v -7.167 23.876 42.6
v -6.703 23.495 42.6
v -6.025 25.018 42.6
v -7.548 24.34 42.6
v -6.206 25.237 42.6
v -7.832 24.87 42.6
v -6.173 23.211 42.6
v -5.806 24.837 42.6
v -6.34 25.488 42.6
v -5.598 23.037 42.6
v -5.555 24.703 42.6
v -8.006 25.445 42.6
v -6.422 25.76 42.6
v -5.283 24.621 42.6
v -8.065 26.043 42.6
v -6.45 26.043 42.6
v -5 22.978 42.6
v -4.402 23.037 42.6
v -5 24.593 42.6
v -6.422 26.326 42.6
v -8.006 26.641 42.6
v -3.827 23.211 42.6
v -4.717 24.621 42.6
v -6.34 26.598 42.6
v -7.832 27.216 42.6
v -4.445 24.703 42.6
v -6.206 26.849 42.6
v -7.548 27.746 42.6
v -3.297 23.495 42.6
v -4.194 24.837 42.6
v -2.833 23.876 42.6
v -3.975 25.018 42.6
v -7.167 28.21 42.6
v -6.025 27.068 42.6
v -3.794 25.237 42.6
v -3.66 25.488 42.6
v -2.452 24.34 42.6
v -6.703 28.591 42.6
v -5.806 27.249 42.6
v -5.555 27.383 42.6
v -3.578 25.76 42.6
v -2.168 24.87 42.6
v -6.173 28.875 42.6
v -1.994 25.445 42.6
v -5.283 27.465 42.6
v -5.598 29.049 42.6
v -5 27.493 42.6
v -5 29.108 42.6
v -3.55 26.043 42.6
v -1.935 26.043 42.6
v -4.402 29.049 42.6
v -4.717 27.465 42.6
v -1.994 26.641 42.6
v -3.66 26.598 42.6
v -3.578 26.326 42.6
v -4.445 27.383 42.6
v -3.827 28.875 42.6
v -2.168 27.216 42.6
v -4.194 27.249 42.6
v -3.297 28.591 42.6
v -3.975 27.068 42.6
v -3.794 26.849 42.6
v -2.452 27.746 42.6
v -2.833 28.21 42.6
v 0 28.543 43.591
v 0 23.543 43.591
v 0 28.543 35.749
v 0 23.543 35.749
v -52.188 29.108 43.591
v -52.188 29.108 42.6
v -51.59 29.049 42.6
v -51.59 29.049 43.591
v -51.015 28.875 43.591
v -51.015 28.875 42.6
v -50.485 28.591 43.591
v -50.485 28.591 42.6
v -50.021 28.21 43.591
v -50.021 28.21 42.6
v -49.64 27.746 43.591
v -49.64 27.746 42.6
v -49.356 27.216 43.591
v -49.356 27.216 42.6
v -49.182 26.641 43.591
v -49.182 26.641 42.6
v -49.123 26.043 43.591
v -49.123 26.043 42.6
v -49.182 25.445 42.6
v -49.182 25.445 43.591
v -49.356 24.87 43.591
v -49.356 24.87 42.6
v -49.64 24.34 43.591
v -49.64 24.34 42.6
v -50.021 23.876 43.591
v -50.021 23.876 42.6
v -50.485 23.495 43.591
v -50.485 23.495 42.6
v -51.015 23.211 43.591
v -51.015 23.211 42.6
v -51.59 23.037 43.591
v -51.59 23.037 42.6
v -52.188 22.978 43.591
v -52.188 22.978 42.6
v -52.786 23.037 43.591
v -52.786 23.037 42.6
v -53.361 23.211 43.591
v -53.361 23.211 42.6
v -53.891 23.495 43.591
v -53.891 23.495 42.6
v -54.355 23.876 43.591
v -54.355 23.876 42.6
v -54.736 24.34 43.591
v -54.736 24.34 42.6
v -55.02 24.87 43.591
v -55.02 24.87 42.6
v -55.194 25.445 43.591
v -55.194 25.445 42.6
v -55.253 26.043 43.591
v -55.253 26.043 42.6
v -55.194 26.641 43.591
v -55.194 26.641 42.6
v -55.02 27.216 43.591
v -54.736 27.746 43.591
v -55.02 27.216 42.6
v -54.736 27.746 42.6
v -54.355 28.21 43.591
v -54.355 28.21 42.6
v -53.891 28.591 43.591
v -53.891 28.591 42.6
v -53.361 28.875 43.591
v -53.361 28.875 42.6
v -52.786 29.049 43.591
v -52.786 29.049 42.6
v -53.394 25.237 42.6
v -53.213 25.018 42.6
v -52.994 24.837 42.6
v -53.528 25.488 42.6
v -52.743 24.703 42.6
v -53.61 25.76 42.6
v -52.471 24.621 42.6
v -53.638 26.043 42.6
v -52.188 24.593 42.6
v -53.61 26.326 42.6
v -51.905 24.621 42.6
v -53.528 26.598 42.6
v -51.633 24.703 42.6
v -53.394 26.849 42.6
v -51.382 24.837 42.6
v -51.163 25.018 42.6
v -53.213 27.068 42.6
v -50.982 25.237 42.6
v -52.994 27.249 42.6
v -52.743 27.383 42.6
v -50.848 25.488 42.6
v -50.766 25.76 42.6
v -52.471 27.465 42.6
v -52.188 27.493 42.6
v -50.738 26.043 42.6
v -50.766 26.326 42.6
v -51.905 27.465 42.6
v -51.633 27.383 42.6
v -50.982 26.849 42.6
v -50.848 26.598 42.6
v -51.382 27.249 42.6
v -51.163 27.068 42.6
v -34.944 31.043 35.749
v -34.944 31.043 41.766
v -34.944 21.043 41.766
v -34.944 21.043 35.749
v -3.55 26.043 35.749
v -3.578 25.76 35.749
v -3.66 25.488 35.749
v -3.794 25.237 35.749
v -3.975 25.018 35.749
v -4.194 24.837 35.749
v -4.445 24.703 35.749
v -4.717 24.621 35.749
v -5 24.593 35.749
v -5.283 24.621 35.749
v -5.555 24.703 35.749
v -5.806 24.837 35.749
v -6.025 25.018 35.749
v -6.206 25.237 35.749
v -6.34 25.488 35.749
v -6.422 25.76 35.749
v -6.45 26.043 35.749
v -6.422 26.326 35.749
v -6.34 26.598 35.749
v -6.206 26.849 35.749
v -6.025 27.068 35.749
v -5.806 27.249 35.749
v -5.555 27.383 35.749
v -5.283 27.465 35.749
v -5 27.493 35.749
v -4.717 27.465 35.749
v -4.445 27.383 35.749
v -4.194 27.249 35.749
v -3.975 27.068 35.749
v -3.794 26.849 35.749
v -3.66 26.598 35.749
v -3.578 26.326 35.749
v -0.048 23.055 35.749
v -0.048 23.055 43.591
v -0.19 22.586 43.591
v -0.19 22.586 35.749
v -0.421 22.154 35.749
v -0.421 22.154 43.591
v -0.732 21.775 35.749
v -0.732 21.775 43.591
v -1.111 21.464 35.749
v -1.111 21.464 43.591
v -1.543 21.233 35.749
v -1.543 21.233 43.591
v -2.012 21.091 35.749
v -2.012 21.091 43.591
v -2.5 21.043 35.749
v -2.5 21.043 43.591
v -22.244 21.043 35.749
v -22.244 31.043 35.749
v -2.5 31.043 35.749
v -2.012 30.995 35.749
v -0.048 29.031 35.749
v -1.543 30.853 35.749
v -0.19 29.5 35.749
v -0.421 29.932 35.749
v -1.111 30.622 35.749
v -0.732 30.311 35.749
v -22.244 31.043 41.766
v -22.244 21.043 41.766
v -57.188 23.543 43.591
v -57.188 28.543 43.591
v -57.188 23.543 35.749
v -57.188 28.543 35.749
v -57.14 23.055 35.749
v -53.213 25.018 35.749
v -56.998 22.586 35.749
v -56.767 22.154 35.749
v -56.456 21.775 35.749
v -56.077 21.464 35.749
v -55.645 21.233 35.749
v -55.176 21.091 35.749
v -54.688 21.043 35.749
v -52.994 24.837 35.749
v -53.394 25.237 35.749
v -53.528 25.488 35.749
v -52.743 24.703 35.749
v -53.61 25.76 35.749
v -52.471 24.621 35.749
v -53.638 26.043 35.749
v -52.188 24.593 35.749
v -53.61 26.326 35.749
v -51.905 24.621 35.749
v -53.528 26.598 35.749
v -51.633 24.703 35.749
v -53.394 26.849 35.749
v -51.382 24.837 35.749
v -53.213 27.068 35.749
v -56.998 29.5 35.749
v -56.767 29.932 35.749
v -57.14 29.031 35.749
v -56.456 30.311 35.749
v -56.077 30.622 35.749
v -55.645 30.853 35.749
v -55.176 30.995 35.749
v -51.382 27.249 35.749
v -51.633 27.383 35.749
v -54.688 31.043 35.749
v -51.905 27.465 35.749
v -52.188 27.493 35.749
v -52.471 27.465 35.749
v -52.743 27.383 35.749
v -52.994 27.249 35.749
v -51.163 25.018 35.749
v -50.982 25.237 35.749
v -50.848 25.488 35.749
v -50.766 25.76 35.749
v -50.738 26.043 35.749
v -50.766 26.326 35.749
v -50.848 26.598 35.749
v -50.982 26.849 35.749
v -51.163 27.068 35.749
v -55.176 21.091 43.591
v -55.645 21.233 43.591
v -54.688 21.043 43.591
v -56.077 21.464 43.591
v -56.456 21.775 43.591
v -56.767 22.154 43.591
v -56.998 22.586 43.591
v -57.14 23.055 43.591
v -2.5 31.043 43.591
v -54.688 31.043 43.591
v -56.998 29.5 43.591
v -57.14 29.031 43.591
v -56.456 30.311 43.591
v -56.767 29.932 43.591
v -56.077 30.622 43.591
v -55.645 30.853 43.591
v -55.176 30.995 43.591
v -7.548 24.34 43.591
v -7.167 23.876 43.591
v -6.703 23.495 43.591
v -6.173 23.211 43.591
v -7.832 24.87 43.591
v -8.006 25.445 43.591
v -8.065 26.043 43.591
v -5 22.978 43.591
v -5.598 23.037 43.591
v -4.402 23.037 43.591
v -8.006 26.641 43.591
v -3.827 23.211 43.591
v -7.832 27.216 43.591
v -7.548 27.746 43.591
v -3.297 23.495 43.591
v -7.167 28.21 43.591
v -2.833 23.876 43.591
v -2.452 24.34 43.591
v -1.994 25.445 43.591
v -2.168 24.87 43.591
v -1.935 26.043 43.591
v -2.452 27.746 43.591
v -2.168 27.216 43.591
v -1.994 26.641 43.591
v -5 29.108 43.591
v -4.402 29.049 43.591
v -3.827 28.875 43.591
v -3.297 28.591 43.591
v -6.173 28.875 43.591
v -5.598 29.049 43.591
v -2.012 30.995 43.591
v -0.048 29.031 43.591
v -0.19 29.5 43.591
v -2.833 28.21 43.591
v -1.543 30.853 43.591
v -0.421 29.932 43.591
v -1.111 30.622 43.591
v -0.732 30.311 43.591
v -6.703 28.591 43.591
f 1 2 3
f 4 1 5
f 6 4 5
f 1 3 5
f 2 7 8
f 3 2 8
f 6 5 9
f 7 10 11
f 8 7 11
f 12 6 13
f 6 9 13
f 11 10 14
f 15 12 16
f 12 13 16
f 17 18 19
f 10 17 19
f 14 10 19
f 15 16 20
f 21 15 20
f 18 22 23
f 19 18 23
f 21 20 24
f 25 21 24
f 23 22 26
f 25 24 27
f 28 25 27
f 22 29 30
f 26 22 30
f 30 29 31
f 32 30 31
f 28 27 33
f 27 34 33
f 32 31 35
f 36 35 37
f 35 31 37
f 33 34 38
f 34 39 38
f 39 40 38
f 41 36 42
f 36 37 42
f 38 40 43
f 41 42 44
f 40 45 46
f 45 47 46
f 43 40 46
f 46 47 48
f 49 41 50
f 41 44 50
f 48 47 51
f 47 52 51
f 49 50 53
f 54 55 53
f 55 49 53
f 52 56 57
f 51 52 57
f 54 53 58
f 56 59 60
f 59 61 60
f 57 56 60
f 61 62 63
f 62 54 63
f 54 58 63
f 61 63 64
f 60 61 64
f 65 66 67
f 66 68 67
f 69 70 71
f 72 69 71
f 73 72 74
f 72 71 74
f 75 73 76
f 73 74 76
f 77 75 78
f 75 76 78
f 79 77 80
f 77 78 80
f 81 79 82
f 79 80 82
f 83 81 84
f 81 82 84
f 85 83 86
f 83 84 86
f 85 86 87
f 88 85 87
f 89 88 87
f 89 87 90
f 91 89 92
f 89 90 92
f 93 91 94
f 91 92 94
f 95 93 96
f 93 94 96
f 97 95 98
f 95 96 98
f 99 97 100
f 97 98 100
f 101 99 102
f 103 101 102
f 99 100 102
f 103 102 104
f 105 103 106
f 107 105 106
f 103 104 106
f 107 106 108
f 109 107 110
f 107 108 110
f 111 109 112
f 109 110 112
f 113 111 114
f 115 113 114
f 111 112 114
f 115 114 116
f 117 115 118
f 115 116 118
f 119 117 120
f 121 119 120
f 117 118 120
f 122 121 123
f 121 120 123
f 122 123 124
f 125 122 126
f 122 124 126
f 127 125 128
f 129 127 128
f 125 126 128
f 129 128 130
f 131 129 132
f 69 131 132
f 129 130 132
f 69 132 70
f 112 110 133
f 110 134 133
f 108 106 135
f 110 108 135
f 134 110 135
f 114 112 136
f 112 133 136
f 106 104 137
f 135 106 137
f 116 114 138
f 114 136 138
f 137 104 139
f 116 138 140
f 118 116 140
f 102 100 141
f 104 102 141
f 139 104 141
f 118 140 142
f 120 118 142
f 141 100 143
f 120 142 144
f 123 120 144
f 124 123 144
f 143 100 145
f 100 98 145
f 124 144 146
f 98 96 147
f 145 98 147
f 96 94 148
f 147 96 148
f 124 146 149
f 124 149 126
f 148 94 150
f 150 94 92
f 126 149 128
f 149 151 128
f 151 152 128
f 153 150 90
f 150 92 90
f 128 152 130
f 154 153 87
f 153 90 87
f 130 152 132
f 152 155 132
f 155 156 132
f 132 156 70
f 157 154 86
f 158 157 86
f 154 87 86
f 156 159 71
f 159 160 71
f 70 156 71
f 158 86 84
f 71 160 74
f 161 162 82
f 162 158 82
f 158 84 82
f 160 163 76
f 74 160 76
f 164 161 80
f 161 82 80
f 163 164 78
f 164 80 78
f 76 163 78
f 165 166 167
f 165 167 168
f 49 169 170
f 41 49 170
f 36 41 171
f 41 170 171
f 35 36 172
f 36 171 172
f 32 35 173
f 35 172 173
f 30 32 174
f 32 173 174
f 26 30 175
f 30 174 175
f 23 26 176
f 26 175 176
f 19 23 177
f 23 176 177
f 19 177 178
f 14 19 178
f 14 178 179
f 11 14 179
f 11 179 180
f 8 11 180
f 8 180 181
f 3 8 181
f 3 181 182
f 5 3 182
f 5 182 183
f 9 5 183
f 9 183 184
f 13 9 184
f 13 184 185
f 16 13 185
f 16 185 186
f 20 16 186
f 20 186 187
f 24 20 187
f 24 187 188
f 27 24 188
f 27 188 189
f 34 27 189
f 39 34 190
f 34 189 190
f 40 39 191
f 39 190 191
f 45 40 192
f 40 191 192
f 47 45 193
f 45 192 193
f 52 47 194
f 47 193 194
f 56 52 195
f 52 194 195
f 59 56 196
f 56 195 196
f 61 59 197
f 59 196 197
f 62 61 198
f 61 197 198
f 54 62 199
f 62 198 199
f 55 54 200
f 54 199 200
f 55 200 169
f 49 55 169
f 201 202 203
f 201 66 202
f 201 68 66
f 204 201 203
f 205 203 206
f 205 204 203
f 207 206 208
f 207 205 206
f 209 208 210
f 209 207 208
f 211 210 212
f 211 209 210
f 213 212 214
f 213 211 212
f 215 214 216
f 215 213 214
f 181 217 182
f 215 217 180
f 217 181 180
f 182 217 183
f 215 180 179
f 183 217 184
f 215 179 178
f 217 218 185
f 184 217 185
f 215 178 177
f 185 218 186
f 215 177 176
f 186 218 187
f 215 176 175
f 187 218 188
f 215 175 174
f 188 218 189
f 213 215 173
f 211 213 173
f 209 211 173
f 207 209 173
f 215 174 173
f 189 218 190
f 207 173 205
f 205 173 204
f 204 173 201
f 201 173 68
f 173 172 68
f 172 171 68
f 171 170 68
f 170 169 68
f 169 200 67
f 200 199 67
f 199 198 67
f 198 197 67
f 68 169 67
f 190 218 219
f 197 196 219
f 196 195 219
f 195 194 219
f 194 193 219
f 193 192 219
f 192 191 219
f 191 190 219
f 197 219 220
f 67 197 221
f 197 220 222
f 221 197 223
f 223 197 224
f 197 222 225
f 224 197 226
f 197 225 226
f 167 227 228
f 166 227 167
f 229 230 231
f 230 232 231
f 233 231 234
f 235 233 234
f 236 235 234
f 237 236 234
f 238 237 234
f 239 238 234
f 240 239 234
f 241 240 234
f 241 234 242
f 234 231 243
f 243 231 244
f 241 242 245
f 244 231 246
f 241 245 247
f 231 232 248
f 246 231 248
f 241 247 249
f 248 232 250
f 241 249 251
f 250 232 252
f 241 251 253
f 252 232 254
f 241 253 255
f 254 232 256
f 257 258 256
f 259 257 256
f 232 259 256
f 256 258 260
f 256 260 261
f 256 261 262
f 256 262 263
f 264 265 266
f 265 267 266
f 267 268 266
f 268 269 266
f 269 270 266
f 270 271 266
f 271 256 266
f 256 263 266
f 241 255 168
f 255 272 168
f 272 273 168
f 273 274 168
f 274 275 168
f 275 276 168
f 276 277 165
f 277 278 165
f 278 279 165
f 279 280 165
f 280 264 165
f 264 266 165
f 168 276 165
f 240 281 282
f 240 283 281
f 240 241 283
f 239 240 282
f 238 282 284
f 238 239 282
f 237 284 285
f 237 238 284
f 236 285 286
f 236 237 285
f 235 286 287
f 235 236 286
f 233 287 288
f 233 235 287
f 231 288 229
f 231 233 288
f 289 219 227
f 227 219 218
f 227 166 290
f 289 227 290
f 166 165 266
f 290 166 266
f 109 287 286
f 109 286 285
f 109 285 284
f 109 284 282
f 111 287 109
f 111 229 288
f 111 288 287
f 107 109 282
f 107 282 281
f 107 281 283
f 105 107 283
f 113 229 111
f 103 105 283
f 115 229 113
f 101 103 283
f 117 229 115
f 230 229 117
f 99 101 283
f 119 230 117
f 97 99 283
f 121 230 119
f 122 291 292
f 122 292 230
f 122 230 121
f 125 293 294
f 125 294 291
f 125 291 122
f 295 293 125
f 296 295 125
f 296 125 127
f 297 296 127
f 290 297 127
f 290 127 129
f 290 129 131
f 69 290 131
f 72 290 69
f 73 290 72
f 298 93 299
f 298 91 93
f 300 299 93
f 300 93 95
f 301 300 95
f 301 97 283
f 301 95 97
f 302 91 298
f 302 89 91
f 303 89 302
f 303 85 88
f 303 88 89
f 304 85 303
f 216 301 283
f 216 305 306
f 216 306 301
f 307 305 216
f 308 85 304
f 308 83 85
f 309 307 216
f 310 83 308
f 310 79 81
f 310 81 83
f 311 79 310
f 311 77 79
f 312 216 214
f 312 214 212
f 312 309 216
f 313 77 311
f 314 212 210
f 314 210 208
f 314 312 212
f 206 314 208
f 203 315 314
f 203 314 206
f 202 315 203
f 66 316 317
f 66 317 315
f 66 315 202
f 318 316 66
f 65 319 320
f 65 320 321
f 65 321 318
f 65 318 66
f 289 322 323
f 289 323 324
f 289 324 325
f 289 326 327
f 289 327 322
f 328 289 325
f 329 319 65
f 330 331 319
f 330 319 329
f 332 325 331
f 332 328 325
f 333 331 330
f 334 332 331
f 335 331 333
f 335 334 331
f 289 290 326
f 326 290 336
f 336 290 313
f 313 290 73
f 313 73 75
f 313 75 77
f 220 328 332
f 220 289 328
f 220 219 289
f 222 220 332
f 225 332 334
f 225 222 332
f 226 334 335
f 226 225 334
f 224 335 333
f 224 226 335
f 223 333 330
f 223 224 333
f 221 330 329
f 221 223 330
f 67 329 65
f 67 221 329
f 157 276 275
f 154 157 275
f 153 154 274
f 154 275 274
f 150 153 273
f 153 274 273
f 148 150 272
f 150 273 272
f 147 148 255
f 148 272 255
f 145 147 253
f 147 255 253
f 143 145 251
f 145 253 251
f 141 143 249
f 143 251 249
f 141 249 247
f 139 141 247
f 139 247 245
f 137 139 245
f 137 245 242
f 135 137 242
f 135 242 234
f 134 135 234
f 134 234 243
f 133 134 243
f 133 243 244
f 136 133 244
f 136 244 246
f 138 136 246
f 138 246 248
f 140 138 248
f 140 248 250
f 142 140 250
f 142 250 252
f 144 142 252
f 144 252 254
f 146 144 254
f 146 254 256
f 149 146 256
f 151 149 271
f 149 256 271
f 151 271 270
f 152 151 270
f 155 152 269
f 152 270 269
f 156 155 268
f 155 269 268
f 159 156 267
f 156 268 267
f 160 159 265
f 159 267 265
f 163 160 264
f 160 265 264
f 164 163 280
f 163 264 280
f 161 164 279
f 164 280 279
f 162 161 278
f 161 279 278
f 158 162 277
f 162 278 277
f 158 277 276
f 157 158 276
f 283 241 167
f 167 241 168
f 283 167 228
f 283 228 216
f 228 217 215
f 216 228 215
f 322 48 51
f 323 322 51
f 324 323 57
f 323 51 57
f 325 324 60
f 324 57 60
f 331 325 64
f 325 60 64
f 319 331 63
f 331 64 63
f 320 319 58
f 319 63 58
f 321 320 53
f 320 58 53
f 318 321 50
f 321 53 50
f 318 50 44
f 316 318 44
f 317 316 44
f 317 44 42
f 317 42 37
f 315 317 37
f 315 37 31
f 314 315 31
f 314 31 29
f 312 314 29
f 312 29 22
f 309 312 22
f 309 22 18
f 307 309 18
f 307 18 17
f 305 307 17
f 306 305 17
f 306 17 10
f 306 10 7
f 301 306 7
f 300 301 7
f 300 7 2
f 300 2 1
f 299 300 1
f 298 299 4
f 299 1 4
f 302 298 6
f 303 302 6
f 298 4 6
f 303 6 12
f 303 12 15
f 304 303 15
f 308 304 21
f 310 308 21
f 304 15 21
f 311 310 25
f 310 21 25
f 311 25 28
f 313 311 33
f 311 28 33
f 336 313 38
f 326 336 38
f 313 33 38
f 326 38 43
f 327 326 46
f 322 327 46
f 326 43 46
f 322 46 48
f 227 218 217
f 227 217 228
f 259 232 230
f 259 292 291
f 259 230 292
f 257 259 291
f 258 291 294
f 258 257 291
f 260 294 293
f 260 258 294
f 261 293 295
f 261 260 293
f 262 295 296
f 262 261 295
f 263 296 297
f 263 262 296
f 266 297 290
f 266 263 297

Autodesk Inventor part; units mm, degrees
ref_plane "YZ Plane" through (0, 0, 0) normal (1, 0, 0) x (0, 1, 0)
ref_plane "XZ Plane" through (0, 0, 0) normal (0, 1, 0) x (-1, 0, 0)
ref_plane "XY Plane" through (0, 0, 0) normal (0, 0, 1) x (1, 0, 0)
ref_plane "Work Plane1" through (-28.594, 4.5215, 35.749) normal (0, 0, 1) x (1, 0, 0)
sketch "Sketch1" plane through (-28.594, 4.5215, 35.749) normal (0, 0, 1) x (1, 0, 0)
  circle A0 centre (23.594, 21.5215) radius 1.45 projected
  circle A1 centre (-23.594, 21.5215) radius 1.45 projected
  circle A2 centre (23.594, 21.5215) radius 1.45 projected
  arc A3 (-26.094, 26.5215) -> (-28.594, 24.0215) centre (-26.094, 24.0215) ccw projected
  line L0 (26.094, 26.5215) -> (-26.094, 26.5215) projected
  arc A4 (28.594, 24.0215) -> (26.094, 26.5215) centre (26.094, 24.0215) ccw projected
  line L1 (28.594, 19.0215) -> (28.594, 24.0215) projected
  arc A5 (26.094, 16.5215) -> (28.594, 19.0215) centre (26.094, 19.0215) ccw projected
  line L2 (-26.094, 16.5215) -> (26.094, 16.5215) projected
  arc A6 (-28.594, 19.0215) -> (-26.094, 16.5215) centre (-26.094, 19.0215) ccw projected
  line L3 (-28.594, 24.0215) -> (-28.594, 19.0215) projected
  circle A7 centre (-23.594, 21.5215) radius 1.45 projected
  point P0 (28.594, -4.5215)
extrude "Extrusion1" add sketch "Sketch1" along normal blind 7.842
sketch "Sketch2" plane through (-54.688, 31.043, 35.749) normal (0, 1, 0) x (1, 0, 0)
  line L0 (32.3438, -5.842) -> (19.8438, -5.842) construction
  line L1 (19.8438, -5.842) -> (19.8438, 0) construction
  line L2 (19.8438, 0) -> (32.3438, 0) construction
  line L3 (32.3438, 0) -> (32.3438, -5.842) construction
  line L4 (52.188, 0) -> (0, 0) projected
  line L5 (32.4438, 0) -> (32.4438, -6.017)
  line L6 (32.4438, -6.017) -> (19.7438, -6.017)
  line L7 (19.7438, -6.017) -> (19.7438, 0)
  point P0 (54.688, 35.749)
  dimension "d2" = 0.1
  dimension "d3" = 0.1
  dimension "d4" = 0.175
extrude "Extrusion2" cut sketch "Sketch2" against normal blind 12.908
ref_plane "Work Plane2" through (-52.188, -17, 42.6) normal (0, 0, -1) x (0, 1, 0)
sketch "Sketch3" plane through (-52.188, -17, 42.6) normal (0, 0, -1) x (0, 1, 0)
  line L0 (45.543, -5) -> (40.543, -5) projected
  arc A0 (38.043, -2.5) -> (40.543, -5) centre (40.543, -2.5) ccw projected
  line L1 (38.043, -2.5) -> (38.043, 49.688) projected
  arc A1 (40.543, 52.188) -> (38.043, 49.688) centre (40.543, 49.688) ccw projected
  line L2 (40.543, 52.188) -> (45.543, 52.188) projected
  arc A2 (48.043, 49.688) -> (45.543, 52.188) centre (45.543, 49.688) ccw projected
  line L3 (48.043, 49.688) -> (48.043, -2.5) projected
  arc A3 (45.543, -5) -> (48.043, -2.5) centre (45.543, -2.5) ccw projected
  circle A4 centre (43.043, 47.188) radius 1.45 projected
  circle A5 centre (43.043, 0) radius 1.45 projected
  circle A6 centre (0, 47.188) radius 3.065 projected
  circle A7 centre (43.043, 47.188) radius 3.065 projected
  circle A8 centre (43.043, 0) radius 3.065 projected
  point P0 (17, 52.188)
extrude "Extrusion3" cut sketch "Sketch3" against normal blind 12.908 contours A4 | A5 | A7 | A8
properties part number "connectorHolder"
